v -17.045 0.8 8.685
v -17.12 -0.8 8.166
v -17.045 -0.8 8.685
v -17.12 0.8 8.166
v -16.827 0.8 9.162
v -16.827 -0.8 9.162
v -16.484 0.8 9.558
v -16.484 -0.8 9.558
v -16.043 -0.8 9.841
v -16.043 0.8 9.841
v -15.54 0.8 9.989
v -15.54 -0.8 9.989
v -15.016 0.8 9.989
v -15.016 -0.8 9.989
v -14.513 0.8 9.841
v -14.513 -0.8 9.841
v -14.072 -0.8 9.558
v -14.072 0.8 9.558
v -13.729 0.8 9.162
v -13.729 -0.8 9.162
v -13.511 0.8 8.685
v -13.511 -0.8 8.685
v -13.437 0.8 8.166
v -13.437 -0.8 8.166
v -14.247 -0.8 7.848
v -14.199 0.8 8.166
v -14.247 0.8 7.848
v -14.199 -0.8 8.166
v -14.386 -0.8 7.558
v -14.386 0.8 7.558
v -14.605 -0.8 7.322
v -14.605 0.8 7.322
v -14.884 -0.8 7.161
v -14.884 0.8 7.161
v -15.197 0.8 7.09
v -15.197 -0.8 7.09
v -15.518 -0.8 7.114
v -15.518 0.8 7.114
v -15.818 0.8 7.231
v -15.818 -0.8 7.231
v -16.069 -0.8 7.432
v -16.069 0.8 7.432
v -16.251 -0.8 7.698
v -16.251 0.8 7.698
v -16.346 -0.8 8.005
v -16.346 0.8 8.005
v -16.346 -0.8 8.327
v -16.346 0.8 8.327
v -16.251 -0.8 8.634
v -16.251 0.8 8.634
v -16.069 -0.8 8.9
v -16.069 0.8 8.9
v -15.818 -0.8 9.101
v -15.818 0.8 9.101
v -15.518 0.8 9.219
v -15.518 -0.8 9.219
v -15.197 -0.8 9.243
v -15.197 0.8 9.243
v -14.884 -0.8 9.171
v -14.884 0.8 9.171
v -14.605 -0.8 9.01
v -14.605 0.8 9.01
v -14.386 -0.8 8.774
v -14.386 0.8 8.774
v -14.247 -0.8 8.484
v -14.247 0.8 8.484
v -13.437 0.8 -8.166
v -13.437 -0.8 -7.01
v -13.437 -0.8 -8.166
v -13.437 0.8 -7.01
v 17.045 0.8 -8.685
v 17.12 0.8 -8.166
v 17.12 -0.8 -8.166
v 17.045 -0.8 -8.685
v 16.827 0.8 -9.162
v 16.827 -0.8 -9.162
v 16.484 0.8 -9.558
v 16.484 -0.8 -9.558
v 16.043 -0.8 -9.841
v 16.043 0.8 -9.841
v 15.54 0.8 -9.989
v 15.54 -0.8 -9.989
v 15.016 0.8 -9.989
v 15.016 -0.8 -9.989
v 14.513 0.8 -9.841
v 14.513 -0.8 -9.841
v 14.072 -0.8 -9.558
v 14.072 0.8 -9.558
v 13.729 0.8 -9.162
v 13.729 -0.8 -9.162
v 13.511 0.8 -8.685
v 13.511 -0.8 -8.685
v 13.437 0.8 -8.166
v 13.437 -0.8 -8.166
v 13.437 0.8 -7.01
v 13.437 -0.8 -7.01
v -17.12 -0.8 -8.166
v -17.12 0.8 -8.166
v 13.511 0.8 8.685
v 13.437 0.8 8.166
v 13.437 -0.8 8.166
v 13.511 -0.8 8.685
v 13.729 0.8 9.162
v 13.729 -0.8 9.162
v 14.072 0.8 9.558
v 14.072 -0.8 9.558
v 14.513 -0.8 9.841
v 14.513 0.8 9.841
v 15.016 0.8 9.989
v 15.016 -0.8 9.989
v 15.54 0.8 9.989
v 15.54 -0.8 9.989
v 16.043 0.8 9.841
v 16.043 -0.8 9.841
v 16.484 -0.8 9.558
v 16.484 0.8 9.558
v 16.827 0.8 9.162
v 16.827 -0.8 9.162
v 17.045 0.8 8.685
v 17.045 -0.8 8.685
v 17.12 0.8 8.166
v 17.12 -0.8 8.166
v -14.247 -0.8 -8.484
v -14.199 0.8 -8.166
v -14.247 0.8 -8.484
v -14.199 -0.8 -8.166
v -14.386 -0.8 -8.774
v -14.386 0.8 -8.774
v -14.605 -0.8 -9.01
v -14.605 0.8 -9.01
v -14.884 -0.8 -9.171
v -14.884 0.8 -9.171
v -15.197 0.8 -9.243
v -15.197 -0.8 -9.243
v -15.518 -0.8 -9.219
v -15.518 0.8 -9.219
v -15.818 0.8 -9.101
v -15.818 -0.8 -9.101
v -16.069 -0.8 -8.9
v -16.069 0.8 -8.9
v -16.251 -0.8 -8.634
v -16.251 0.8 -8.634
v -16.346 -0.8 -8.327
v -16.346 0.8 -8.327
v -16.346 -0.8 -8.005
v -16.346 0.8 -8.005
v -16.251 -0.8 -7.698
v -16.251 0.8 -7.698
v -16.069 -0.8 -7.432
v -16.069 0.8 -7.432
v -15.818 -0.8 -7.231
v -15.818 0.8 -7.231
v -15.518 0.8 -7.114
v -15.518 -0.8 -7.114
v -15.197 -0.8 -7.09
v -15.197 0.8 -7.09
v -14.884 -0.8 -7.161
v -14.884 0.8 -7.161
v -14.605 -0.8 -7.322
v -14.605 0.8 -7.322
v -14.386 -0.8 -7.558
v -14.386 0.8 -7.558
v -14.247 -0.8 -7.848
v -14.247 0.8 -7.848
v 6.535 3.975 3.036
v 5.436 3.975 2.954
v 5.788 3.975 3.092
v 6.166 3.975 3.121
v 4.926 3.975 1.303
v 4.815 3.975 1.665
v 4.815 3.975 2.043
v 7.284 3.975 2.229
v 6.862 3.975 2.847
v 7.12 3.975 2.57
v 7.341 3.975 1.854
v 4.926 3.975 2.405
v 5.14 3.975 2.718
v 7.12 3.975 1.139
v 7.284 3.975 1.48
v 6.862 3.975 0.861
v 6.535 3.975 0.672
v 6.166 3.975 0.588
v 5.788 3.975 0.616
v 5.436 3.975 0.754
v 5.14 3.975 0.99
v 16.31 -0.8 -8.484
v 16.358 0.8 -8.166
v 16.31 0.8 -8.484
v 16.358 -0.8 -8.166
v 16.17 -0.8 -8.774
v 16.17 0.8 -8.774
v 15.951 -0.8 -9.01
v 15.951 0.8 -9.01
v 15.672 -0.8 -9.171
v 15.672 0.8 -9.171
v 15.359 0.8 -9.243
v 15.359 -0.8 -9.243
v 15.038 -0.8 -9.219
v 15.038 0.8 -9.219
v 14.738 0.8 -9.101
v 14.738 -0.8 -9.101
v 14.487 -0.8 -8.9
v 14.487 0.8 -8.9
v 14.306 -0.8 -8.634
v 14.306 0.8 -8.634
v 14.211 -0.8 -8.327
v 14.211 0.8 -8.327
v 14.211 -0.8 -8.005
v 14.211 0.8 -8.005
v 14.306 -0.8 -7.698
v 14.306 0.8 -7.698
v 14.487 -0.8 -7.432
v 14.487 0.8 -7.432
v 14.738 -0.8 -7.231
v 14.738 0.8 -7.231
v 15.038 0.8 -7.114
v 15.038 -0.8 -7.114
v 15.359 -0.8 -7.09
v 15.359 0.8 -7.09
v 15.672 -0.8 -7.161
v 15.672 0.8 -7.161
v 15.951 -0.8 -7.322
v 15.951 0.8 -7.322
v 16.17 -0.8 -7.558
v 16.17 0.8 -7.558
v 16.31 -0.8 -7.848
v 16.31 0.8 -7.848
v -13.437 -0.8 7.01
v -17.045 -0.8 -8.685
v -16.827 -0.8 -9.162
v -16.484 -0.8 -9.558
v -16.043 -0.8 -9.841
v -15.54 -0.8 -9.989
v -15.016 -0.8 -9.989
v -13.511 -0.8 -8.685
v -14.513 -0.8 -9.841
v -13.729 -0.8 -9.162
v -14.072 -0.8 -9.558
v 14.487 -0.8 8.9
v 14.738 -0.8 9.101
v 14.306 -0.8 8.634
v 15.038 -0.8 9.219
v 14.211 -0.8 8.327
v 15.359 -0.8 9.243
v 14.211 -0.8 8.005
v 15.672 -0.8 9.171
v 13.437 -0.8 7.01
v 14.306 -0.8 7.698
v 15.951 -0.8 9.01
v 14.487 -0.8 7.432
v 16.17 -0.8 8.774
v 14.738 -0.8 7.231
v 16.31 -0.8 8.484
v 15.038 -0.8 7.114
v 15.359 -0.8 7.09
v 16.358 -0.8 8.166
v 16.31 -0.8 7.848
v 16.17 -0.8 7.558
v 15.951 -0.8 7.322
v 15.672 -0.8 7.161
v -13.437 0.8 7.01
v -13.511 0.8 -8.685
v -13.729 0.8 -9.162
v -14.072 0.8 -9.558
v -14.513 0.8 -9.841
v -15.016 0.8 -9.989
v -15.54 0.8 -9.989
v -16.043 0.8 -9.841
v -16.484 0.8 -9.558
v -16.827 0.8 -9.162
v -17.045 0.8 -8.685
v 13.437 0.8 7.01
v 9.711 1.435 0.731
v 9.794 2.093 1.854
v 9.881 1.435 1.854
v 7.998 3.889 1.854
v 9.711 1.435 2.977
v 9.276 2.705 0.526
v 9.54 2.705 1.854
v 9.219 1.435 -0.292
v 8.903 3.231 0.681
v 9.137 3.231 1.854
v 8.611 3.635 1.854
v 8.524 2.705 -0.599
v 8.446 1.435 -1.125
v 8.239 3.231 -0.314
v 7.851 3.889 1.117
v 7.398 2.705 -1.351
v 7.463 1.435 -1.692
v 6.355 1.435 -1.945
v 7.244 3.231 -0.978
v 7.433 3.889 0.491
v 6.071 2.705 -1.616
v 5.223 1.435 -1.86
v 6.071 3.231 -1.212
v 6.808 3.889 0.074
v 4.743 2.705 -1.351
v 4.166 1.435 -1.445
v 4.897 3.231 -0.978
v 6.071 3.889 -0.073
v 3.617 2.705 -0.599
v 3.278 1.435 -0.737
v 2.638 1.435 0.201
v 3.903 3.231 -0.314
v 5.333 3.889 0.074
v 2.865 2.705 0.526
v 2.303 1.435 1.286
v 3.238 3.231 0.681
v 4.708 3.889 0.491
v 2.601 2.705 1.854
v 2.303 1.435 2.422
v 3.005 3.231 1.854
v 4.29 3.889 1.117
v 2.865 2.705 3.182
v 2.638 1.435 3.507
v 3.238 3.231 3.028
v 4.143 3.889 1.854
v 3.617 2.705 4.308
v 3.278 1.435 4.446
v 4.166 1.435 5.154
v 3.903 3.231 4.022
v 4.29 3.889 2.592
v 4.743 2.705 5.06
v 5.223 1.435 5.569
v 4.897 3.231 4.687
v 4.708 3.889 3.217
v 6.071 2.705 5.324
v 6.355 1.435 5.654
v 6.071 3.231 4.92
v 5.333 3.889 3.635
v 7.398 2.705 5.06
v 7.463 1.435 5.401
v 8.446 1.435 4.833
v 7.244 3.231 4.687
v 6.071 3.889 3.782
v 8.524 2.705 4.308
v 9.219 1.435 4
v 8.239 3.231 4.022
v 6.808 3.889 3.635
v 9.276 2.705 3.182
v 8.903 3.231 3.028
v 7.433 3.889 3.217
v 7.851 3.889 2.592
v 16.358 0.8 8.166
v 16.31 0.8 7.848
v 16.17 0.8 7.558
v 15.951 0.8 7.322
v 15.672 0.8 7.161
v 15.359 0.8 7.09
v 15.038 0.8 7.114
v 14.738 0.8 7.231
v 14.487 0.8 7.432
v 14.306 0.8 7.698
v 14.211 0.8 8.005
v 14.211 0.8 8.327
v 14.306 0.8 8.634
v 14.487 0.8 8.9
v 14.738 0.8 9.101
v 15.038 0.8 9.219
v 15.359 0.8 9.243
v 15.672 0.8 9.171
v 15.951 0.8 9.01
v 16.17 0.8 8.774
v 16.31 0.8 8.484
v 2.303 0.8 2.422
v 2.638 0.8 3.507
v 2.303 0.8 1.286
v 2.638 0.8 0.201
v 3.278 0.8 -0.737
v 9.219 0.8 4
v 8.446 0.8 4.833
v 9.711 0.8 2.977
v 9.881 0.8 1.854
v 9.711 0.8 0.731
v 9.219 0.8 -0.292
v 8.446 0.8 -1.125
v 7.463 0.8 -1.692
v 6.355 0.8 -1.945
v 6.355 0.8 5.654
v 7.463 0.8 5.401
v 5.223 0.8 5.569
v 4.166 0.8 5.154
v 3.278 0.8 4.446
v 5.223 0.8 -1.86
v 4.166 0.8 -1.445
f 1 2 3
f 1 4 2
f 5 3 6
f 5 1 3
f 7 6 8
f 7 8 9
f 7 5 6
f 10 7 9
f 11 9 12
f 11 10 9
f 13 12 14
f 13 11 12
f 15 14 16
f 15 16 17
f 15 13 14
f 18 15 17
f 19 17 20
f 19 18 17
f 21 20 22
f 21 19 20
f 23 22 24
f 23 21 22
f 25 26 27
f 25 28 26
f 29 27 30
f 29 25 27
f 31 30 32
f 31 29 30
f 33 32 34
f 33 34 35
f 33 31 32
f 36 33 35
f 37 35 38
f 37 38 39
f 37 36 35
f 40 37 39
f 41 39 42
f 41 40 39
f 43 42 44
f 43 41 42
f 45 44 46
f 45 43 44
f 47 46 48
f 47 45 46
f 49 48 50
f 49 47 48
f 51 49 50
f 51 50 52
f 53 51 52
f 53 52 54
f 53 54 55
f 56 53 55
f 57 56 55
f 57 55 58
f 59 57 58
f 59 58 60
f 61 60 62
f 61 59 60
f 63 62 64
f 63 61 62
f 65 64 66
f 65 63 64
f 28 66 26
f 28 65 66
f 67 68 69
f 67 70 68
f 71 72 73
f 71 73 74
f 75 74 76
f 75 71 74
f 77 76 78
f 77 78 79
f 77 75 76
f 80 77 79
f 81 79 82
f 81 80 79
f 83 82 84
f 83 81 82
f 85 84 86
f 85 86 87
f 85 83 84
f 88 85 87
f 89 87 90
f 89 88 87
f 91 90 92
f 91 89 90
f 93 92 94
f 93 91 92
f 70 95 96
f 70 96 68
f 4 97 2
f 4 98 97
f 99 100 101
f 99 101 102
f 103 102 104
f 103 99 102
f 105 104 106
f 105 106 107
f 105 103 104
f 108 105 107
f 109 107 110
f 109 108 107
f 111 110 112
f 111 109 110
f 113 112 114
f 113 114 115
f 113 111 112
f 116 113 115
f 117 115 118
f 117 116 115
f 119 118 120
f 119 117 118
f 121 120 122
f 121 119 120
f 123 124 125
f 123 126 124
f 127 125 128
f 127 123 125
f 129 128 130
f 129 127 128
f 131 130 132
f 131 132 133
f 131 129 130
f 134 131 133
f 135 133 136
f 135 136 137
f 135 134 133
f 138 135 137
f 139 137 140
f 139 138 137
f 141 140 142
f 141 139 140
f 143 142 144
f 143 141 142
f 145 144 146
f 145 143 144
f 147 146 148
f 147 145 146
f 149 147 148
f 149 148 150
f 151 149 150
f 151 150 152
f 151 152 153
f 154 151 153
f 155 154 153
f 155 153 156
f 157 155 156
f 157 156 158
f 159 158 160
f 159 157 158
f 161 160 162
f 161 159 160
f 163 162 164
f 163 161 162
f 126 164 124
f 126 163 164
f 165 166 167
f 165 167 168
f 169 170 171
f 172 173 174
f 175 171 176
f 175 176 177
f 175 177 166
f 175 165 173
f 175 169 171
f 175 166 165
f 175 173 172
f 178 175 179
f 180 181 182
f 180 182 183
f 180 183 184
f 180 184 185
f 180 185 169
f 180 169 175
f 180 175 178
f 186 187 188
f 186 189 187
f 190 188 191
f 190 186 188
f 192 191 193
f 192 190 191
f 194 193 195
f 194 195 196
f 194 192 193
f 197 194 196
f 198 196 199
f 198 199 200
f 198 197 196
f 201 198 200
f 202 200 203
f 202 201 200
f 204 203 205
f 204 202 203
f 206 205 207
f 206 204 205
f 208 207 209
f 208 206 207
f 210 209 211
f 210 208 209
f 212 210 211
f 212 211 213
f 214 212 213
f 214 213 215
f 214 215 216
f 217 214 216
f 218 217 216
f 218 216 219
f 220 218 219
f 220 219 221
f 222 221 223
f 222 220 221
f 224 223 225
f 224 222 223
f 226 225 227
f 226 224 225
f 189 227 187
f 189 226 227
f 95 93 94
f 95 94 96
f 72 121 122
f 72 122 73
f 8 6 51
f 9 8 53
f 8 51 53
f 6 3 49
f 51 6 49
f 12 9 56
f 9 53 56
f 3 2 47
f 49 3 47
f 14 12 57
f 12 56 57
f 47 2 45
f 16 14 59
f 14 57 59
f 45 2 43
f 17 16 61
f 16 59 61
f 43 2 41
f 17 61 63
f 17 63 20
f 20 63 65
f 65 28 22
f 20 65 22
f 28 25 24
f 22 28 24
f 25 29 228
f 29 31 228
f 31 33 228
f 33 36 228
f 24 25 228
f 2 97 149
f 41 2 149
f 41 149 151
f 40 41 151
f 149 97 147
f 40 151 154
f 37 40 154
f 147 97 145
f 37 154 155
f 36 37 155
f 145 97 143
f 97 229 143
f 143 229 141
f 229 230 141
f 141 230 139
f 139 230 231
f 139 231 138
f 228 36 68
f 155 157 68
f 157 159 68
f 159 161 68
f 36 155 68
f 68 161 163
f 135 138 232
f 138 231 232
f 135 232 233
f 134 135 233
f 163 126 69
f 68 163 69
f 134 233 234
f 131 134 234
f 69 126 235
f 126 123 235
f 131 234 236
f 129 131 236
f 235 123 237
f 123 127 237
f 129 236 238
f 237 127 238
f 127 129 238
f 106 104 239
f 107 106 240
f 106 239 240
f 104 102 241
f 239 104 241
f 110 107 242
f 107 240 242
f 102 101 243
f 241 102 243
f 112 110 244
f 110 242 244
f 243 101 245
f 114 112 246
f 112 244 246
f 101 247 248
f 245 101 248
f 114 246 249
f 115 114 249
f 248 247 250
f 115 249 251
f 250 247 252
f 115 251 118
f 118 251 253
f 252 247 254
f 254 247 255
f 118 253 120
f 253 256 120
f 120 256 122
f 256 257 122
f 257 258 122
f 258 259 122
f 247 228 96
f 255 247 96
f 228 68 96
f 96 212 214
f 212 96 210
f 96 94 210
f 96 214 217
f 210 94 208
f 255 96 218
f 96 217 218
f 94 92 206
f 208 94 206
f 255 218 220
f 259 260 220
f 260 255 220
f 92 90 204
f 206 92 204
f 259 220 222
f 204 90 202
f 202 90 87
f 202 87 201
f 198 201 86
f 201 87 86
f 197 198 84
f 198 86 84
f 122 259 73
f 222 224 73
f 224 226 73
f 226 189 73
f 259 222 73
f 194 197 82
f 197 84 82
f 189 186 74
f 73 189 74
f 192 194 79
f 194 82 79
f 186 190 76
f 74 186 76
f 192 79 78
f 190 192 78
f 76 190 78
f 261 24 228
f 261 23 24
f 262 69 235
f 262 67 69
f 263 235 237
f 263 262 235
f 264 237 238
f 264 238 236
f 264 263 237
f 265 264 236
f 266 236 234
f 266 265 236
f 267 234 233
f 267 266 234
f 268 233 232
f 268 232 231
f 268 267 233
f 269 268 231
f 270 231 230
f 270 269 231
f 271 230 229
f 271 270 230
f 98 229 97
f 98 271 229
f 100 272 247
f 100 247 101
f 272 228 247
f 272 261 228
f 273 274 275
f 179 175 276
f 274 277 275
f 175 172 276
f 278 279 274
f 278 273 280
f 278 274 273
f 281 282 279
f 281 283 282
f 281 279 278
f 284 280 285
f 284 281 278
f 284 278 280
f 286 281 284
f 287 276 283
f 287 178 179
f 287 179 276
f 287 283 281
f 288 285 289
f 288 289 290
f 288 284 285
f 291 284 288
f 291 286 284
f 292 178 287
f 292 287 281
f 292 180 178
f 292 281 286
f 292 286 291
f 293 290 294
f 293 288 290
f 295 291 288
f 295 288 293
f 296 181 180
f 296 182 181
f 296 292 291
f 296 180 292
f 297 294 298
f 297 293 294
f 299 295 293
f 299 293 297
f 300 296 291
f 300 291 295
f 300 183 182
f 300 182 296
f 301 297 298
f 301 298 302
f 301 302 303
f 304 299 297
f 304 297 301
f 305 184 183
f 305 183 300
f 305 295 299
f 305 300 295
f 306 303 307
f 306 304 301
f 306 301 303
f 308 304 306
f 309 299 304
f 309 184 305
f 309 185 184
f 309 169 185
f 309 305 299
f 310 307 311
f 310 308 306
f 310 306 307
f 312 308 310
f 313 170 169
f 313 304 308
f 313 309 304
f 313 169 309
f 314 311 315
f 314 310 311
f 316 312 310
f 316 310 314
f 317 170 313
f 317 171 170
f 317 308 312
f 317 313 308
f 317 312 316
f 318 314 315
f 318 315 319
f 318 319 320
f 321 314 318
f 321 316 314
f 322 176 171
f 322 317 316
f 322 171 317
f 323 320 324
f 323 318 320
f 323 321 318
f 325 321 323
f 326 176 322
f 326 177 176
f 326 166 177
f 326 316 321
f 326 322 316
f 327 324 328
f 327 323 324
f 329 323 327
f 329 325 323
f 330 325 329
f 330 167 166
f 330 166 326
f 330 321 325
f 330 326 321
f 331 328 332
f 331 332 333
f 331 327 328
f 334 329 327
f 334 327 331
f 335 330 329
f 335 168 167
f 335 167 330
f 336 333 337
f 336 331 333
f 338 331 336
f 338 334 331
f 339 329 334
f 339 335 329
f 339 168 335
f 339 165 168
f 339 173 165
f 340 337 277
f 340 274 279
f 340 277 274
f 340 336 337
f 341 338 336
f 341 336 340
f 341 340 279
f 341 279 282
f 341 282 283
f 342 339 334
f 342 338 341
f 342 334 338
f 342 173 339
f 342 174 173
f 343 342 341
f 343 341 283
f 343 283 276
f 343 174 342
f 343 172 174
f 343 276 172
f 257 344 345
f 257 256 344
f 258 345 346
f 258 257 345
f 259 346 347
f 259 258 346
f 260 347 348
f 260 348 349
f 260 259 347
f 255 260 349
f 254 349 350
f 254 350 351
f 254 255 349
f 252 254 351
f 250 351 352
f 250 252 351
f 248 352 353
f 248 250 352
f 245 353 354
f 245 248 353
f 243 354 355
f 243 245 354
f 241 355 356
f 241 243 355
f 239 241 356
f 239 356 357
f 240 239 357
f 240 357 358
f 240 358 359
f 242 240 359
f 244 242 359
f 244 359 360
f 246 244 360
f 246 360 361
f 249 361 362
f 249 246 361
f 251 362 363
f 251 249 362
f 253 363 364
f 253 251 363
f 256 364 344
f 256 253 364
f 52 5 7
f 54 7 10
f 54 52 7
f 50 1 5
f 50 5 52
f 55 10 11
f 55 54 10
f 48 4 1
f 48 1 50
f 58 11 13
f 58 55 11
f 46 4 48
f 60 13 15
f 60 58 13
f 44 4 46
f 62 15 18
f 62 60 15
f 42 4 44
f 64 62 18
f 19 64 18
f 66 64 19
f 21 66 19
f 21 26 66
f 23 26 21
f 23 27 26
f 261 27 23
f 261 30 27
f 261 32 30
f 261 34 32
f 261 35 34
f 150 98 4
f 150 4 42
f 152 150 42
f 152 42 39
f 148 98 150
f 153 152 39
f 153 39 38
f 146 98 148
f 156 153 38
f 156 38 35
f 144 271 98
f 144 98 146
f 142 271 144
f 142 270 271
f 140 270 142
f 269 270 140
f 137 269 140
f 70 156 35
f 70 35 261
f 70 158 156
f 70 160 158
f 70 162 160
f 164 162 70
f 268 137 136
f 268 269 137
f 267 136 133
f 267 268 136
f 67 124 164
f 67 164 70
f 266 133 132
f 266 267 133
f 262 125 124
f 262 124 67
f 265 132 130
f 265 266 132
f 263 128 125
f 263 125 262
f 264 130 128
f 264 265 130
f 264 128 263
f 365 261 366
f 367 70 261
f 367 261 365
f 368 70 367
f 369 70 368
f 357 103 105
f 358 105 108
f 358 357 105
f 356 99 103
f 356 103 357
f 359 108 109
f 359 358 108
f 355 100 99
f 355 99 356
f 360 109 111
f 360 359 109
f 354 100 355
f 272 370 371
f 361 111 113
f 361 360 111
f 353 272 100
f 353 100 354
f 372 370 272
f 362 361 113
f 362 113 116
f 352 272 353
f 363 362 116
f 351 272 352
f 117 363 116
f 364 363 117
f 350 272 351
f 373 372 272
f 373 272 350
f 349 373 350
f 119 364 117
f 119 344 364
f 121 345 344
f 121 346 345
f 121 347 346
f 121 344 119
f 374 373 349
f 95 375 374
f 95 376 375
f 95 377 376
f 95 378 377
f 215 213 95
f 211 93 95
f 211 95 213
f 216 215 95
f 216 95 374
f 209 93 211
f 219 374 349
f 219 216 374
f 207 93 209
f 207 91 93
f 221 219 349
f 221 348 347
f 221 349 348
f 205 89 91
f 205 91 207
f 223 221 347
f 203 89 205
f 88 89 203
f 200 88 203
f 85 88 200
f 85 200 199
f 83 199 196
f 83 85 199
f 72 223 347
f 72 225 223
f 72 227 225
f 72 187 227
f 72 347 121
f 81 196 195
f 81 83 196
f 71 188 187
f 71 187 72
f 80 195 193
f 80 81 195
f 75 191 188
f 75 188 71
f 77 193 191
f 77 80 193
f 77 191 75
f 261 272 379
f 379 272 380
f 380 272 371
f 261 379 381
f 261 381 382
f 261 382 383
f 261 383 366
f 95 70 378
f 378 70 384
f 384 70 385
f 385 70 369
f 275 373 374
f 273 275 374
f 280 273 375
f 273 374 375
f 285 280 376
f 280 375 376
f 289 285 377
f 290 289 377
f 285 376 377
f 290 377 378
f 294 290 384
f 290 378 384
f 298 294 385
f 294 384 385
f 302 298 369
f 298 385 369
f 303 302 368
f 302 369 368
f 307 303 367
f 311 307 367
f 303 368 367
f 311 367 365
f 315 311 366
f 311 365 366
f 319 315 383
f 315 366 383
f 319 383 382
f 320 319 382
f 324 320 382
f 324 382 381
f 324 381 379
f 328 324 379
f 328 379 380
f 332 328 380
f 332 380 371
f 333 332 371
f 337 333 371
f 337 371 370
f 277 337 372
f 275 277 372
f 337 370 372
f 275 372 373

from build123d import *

# Parameters (mm, degrees)
SKETCH1_R           = 1.0795
BOSS_EXTRUDE1_DEPTH = 0.8001
SKETCH2_R           = 3.81
BOSS_EXTRUDE2_DEPTH = 3.175
FILLET1_R           = 2.54


with BuildPart() as part:
    # Sketch1 → Boss-Extrude1 (new body, symmetric)
    with BuildSketch(Plane(origin=(0, 0, 0), x_dir=(1, 0, 0), z_dir=(0, 1, 0))):
        with BuildLine():
            Line((-13.4366, -7.0104), (13.4366, -7.0104))
            Line((13.4366, -7.0104), (13.4366, -8.1661))
            ThreePointArc((13.4366, -8.1661), (15.2781, -10.0076), (17.1196, -8.1661))
            Line((17.1196, -8.1661), (17.1196, -7.0104))
            Line((17.1196, -7.0104), (17.1196, 7.0104))
            Line((17.1196, 7.0104), (17.1196, 8.1661))
            ThreePointArc((17.1196, 8.1661), (15.2781, 10.0076), (13.4366, 8.1661))
            Line((13.4366, 8.1661), (13.4366, 7.0104))
            Line((13.4366, 7.0104), (-13.4366, 7.0104))
            Line((-13.4366, 7.0104), (-13.4366, 8.1661))
            ThreePointArc((-13.4366, 8.1661), (-15.2781, 10.0076), (-17.1196, 8.1661))
            Line((-17.1196, 8.1661), (-17.1196, 7.0104))
            Line((-17.1196, 7.0104), (-17.1196, -7.0104))
            Line((-17.1196, -7.0104), (-17.1196, -8.1661))
            ThreePointArc((-17.1196, -8.1661), (-15.2781, -10.0076), (-13.4366, -8.1661))
            Line((-13.4366, -8.1661), (-13.4366, -7.0104))
        make_face()
        with Locations((-15.2781, 8.1661)):
            Circle(SKETCH1_R, mode=Mode.SUBTRACT)
        with Locations((-15.2781, -8.1661)):
            Circle(SKETCH1_R, mode=Mode.SUBTRACT)
        with Locations((15.2781, 8.1661)):
            Circle(SKETCH1_R, mode=Mode.SUBTRACT)
        with Locations((15.2781, -8.1661)):
            Circle(SKETCH1_R, mode=Mode.SUBTRACT)
    extrude(amount=BOSS_EXTRUDE1_DEPTH, both=True)

    # Sketch2 → Boss-Extrude2 (add)
    with BuildSketch(Plane(origin=(0, 0.8001, 0), x_dir=(1, 0, 0), z_dir=(0, 1, 0))):
        with Locations((6.0706, -1.8542)):
            Circle(SKETCH2_R)
    extrude(amount=BOSS_EXTRUDE2_DEPTH)

    # Fillet1
    fillet1_edges = [part.edges().sort_by_distance(p)[0] for p in [
        (2.2606, 3.9751, 1.8542),
    ]]
    fillet(fillet1_edges, radius=FILLET1_R)


solid = part.part
